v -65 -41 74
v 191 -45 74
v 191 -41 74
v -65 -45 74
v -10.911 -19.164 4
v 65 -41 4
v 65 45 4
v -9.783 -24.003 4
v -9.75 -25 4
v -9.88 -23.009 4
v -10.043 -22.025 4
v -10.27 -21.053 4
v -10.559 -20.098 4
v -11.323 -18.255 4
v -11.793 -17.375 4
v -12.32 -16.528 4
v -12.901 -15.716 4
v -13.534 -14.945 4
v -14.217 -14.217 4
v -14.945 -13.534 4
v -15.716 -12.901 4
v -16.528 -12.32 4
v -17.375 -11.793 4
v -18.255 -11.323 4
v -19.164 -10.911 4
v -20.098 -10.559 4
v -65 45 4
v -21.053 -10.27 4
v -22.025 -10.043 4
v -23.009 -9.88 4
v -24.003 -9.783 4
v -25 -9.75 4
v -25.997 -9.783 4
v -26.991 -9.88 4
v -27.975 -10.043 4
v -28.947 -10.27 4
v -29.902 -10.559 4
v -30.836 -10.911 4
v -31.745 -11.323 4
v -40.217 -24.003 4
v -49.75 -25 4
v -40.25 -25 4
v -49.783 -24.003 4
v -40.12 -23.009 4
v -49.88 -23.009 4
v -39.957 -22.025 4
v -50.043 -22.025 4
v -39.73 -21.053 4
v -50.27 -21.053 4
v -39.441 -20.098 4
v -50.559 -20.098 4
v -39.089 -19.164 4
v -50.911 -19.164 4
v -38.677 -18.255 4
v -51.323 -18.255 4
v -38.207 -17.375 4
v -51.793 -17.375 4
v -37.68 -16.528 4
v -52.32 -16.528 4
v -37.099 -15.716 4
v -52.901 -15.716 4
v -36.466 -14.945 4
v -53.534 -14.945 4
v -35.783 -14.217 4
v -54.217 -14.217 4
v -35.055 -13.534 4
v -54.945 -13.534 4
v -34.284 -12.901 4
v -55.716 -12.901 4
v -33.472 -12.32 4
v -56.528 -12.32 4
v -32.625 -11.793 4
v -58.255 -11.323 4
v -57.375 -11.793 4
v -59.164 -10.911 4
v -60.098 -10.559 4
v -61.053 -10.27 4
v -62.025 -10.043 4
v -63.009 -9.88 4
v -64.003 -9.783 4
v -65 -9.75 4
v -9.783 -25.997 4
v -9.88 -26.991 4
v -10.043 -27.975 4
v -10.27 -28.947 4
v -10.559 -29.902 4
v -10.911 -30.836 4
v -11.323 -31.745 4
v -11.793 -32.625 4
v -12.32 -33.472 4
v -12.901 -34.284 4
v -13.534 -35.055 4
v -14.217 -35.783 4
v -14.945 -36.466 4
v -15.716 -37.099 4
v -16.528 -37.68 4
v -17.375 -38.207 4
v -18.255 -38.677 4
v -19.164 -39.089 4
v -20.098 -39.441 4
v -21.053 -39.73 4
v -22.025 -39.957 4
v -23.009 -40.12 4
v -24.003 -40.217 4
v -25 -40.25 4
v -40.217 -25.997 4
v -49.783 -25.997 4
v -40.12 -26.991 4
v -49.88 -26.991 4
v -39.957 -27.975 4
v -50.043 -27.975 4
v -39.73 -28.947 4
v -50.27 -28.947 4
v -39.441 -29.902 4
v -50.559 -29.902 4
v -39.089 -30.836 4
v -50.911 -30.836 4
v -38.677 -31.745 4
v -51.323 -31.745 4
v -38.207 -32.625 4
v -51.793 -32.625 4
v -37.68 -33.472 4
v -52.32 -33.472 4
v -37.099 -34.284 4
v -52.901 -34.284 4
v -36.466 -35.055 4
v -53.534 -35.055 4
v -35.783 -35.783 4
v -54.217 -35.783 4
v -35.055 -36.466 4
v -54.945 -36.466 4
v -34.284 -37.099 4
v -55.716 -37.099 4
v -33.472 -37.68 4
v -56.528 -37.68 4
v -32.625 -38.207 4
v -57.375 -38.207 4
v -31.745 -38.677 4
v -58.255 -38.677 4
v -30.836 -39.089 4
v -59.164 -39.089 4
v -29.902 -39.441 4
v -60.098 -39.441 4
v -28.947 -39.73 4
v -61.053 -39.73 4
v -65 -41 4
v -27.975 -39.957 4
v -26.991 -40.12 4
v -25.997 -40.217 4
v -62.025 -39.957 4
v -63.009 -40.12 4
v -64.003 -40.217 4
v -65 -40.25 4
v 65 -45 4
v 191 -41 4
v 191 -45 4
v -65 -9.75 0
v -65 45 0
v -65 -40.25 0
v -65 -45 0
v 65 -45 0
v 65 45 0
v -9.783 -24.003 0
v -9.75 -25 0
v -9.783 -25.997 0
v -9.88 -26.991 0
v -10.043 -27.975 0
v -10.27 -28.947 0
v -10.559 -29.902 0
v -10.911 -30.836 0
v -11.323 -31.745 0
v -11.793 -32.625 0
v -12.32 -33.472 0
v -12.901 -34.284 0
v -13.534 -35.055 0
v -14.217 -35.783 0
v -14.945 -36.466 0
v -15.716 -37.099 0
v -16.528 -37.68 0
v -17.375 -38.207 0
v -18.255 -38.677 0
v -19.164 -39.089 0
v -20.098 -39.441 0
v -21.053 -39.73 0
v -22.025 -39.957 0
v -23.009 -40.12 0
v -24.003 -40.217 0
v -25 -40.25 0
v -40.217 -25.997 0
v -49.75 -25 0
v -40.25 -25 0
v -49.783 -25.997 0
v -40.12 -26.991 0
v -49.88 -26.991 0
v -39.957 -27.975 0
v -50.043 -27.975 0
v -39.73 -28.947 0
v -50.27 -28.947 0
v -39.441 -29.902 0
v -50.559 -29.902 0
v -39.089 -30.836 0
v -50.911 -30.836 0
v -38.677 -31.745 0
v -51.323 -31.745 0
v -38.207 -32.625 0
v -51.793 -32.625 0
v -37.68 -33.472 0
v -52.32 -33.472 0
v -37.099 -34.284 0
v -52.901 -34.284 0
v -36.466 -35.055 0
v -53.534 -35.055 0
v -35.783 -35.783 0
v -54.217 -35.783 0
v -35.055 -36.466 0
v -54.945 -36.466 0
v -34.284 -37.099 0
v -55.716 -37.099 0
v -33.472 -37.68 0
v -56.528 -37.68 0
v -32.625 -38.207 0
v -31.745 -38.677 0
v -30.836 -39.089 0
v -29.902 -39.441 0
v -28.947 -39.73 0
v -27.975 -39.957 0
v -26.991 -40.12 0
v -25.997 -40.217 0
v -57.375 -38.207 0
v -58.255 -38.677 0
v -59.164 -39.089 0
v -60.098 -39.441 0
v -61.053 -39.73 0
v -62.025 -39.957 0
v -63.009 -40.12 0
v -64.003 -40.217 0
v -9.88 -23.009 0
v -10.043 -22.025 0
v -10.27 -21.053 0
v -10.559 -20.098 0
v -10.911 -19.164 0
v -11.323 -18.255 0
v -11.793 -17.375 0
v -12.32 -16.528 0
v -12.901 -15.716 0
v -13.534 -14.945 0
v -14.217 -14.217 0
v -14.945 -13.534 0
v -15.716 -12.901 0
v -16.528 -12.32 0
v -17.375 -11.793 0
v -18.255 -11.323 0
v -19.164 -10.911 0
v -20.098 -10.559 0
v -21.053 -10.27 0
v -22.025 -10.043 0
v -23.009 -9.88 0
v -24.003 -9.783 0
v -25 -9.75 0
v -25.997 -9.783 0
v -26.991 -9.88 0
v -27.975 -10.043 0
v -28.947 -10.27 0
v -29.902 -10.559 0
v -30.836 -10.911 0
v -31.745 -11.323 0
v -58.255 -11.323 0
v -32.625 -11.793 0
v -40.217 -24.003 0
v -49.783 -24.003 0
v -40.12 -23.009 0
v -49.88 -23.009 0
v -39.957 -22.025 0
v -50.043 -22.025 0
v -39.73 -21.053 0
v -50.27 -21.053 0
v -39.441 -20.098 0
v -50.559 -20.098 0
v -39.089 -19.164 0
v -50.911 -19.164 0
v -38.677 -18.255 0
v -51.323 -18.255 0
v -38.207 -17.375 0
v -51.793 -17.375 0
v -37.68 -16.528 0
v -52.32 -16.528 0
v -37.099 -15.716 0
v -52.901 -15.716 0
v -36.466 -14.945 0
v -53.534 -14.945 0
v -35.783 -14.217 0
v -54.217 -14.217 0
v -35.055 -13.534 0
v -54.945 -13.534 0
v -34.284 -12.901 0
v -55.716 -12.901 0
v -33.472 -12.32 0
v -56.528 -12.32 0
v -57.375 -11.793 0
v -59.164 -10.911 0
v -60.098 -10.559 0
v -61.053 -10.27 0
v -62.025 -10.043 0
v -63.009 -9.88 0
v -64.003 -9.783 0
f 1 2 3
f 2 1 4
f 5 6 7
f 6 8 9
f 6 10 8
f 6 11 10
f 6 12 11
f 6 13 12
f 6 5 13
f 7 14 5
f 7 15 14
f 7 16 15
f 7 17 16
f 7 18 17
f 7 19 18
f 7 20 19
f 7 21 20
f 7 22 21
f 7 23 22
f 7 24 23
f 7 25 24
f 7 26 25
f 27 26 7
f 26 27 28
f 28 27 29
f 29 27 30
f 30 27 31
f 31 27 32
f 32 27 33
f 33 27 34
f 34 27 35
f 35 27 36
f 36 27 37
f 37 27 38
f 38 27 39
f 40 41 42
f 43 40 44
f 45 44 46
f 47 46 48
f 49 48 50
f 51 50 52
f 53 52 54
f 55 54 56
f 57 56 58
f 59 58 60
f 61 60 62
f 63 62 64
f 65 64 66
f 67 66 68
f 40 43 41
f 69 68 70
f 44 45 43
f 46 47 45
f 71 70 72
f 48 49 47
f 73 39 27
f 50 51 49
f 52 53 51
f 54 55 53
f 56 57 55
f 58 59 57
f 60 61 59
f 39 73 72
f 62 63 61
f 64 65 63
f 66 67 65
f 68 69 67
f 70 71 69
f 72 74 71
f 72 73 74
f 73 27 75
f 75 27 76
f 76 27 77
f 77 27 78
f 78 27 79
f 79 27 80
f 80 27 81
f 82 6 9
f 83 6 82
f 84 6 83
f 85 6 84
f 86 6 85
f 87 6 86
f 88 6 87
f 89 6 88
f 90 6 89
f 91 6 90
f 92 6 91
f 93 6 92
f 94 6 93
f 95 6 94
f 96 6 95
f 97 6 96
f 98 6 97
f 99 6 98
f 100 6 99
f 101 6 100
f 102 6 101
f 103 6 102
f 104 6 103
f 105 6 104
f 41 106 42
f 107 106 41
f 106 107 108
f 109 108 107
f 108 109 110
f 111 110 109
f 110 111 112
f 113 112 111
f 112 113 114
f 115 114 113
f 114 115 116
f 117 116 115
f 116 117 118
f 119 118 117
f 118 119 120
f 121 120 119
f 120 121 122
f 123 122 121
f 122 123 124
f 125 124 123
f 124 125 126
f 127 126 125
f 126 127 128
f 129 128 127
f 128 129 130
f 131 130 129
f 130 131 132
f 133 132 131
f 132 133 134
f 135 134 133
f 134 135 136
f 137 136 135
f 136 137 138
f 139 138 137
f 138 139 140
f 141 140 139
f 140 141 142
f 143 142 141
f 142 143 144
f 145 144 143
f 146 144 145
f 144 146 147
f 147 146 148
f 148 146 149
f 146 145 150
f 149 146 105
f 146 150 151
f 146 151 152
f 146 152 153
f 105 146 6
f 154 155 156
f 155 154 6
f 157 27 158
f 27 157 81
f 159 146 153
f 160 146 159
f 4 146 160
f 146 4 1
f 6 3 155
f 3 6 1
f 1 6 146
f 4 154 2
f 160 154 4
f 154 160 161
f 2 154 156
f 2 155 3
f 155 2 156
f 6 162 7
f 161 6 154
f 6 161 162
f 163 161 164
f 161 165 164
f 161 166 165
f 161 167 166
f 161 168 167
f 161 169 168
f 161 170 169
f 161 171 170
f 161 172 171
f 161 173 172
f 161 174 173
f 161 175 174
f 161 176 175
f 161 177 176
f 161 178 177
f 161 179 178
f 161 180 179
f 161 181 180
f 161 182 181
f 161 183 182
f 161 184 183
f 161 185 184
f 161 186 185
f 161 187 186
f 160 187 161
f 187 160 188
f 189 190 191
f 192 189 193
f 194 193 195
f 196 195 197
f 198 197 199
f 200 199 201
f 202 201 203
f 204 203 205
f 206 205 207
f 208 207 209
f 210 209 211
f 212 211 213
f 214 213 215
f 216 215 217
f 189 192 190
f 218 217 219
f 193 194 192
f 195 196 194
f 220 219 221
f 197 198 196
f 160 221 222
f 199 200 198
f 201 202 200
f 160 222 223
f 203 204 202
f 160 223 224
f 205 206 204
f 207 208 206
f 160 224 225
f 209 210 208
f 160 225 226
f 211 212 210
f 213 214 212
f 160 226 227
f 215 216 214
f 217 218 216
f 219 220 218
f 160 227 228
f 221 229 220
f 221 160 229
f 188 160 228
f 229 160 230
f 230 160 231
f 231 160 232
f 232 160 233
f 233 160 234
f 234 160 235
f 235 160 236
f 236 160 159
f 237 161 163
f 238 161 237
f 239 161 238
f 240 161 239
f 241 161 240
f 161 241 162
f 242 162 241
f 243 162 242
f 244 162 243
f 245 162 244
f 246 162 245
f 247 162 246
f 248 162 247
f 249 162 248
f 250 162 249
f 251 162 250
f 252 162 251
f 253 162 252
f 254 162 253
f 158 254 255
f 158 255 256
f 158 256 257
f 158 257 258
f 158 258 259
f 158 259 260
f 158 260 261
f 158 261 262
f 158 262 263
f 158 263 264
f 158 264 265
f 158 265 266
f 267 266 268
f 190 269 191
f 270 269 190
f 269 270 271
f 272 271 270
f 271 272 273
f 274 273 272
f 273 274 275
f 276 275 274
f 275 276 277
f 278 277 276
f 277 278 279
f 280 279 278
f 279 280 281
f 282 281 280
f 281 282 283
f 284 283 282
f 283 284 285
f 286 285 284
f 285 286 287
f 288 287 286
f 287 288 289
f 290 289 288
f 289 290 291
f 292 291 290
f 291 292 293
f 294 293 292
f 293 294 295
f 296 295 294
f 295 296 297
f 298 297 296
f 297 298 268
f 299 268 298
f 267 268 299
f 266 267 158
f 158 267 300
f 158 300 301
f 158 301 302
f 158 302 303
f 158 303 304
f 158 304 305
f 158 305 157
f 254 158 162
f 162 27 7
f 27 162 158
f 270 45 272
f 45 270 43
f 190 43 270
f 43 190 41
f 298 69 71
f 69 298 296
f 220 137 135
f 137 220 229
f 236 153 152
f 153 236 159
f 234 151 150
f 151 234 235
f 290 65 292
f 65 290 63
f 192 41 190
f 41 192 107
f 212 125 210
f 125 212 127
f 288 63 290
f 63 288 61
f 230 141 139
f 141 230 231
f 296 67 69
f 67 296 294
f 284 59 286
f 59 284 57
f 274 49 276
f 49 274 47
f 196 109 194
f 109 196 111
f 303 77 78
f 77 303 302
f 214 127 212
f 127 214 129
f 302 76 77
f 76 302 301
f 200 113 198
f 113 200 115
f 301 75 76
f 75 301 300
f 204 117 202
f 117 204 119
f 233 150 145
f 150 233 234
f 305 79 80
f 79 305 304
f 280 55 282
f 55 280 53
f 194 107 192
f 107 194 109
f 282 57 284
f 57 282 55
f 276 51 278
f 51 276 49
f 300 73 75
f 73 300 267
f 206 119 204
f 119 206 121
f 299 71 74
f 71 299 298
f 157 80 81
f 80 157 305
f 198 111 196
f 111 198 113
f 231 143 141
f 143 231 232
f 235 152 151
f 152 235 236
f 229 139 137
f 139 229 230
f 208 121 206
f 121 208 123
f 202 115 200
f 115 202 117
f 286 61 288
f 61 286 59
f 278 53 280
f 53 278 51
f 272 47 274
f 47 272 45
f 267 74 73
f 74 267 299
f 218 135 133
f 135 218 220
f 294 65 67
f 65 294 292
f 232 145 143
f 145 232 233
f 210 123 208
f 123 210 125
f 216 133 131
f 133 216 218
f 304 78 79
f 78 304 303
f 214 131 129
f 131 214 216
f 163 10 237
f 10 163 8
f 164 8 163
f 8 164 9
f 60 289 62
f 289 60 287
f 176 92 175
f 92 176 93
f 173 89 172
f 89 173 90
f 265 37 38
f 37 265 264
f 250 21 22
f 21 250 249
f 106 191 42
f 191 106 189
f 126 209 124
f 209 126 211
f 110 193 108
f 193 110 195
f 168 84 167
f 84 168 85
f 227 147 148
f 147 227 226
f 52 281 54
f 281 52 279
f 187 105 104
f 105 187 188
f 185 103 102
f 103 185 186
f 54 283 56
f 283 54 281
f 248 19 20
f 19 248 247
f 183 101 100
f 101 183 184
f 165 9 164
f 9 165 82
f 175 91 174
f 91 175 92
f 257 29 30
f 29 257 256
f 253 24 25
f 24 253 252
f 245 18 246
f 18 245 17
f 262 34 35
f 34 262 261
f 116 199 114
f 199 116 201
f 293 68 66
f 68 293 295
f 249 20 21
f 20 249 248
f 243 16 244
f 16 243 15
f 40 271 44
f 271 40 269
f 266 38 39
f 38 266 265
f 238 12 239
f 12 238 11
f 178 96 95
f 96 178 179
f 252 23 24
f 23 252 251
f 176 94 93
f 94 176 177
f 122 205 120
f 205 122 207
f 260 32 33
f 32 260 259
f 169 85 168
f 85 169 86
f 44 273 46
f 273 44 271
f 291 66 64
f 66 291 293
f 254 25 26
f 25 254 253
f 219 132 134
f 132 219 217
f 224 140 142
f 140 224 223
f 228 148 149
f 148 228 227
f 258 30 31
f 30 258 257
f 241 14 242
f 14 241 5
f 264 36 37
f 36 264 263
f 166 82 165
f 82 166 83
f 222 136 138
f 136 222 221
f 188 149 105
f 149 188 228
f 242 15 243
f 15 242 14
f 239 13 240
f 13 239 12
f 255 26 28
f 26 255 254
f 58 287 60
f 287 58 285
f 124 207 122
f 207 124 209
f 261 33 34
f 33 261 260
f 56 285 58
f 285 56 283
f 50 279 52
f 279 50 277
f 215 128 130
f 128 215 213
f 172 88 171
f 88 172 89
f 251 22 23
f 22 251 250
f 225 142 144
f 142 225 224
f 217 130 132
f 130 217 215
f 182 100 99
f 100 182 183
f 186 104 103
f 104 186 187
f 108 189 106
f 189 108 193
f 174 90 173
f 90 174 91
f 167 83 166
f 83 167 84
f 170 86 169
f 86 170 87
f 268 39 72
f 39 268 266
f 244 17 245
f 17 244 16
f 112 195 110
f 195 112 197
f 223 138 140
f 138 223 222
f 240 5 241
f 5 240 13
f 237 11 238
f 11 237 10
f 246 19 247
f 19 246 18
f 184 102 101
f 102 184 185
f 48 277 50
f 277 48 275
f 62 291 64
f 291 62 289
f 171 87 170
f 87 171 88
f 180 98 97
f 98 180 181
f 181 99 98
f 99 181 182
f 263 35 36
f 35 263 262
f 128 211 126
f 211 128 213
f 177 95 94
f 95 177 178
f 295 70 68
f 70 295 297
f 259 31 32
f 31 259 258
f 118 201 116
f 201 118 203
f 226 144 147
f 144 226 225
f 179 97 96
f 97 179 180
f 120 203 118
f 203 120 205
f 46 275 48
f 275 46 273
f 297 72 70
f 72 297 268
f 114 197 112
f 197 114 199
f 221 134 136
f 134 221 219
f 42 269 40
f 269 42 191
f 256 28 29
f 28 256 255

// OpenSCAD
// 6 x 50 mL conical (Falcon-type) tube rack
// Print orientation: flat plate on bed, walls rising to z = 70
// After printing, flip over so the rack stands on the walls

// ---------- Parameters ----------
plate_x      = 130;   // plate length along X
plate_y      = 90;    // plate width along Y
plate_t      = 4;     // plate thickness (z = 0 to 4)

hole_d       = 30.5;  // through-hole diameter
hole_nx      = 3;     // holes along X
hole_ny      = 2;     // holes along Y
hole_pitch   = 40;    // centre-to-centre spacing (both directions)

wall_t       = 4;     // wall thickness (Y)
wall_h       = 70;    // wall height from plate top (z = 4 to 74)

eps          = 0.5;   // cutter overshoot past faces
$fn          = 96;    // circle resolution

// ---------- Model ----------
difference() {
    union() {
        // Base plate
        translate([-plate_x/2, -plate_y/2, 0])
            cube([plate_x, plate_y, plate_t]);

        // Two long-edge walls
        for (s = [-1, 1])
            translate([s > 0 ? plate_x/2 - wall_t : -plate_x/2,
                       -plate_y/2,
                       plate_t])
                cube([plate_x, wall_t, wall_h]);
    }

    // Through-holes, centred on plate
    for (i = [0 : hole_nx - 1])
        for (j = [0 : hole_ny - 1])
            translate([(i - (hole_nx - 1)/2) * hole_pitch - plate_x/2,
                       (j - (hole_ny - 1)/2) * hole_pitch - plate_y/2,
                       -eps])
                cylinder(d = hole_d, h = plate_t + 2 * eps);
}
